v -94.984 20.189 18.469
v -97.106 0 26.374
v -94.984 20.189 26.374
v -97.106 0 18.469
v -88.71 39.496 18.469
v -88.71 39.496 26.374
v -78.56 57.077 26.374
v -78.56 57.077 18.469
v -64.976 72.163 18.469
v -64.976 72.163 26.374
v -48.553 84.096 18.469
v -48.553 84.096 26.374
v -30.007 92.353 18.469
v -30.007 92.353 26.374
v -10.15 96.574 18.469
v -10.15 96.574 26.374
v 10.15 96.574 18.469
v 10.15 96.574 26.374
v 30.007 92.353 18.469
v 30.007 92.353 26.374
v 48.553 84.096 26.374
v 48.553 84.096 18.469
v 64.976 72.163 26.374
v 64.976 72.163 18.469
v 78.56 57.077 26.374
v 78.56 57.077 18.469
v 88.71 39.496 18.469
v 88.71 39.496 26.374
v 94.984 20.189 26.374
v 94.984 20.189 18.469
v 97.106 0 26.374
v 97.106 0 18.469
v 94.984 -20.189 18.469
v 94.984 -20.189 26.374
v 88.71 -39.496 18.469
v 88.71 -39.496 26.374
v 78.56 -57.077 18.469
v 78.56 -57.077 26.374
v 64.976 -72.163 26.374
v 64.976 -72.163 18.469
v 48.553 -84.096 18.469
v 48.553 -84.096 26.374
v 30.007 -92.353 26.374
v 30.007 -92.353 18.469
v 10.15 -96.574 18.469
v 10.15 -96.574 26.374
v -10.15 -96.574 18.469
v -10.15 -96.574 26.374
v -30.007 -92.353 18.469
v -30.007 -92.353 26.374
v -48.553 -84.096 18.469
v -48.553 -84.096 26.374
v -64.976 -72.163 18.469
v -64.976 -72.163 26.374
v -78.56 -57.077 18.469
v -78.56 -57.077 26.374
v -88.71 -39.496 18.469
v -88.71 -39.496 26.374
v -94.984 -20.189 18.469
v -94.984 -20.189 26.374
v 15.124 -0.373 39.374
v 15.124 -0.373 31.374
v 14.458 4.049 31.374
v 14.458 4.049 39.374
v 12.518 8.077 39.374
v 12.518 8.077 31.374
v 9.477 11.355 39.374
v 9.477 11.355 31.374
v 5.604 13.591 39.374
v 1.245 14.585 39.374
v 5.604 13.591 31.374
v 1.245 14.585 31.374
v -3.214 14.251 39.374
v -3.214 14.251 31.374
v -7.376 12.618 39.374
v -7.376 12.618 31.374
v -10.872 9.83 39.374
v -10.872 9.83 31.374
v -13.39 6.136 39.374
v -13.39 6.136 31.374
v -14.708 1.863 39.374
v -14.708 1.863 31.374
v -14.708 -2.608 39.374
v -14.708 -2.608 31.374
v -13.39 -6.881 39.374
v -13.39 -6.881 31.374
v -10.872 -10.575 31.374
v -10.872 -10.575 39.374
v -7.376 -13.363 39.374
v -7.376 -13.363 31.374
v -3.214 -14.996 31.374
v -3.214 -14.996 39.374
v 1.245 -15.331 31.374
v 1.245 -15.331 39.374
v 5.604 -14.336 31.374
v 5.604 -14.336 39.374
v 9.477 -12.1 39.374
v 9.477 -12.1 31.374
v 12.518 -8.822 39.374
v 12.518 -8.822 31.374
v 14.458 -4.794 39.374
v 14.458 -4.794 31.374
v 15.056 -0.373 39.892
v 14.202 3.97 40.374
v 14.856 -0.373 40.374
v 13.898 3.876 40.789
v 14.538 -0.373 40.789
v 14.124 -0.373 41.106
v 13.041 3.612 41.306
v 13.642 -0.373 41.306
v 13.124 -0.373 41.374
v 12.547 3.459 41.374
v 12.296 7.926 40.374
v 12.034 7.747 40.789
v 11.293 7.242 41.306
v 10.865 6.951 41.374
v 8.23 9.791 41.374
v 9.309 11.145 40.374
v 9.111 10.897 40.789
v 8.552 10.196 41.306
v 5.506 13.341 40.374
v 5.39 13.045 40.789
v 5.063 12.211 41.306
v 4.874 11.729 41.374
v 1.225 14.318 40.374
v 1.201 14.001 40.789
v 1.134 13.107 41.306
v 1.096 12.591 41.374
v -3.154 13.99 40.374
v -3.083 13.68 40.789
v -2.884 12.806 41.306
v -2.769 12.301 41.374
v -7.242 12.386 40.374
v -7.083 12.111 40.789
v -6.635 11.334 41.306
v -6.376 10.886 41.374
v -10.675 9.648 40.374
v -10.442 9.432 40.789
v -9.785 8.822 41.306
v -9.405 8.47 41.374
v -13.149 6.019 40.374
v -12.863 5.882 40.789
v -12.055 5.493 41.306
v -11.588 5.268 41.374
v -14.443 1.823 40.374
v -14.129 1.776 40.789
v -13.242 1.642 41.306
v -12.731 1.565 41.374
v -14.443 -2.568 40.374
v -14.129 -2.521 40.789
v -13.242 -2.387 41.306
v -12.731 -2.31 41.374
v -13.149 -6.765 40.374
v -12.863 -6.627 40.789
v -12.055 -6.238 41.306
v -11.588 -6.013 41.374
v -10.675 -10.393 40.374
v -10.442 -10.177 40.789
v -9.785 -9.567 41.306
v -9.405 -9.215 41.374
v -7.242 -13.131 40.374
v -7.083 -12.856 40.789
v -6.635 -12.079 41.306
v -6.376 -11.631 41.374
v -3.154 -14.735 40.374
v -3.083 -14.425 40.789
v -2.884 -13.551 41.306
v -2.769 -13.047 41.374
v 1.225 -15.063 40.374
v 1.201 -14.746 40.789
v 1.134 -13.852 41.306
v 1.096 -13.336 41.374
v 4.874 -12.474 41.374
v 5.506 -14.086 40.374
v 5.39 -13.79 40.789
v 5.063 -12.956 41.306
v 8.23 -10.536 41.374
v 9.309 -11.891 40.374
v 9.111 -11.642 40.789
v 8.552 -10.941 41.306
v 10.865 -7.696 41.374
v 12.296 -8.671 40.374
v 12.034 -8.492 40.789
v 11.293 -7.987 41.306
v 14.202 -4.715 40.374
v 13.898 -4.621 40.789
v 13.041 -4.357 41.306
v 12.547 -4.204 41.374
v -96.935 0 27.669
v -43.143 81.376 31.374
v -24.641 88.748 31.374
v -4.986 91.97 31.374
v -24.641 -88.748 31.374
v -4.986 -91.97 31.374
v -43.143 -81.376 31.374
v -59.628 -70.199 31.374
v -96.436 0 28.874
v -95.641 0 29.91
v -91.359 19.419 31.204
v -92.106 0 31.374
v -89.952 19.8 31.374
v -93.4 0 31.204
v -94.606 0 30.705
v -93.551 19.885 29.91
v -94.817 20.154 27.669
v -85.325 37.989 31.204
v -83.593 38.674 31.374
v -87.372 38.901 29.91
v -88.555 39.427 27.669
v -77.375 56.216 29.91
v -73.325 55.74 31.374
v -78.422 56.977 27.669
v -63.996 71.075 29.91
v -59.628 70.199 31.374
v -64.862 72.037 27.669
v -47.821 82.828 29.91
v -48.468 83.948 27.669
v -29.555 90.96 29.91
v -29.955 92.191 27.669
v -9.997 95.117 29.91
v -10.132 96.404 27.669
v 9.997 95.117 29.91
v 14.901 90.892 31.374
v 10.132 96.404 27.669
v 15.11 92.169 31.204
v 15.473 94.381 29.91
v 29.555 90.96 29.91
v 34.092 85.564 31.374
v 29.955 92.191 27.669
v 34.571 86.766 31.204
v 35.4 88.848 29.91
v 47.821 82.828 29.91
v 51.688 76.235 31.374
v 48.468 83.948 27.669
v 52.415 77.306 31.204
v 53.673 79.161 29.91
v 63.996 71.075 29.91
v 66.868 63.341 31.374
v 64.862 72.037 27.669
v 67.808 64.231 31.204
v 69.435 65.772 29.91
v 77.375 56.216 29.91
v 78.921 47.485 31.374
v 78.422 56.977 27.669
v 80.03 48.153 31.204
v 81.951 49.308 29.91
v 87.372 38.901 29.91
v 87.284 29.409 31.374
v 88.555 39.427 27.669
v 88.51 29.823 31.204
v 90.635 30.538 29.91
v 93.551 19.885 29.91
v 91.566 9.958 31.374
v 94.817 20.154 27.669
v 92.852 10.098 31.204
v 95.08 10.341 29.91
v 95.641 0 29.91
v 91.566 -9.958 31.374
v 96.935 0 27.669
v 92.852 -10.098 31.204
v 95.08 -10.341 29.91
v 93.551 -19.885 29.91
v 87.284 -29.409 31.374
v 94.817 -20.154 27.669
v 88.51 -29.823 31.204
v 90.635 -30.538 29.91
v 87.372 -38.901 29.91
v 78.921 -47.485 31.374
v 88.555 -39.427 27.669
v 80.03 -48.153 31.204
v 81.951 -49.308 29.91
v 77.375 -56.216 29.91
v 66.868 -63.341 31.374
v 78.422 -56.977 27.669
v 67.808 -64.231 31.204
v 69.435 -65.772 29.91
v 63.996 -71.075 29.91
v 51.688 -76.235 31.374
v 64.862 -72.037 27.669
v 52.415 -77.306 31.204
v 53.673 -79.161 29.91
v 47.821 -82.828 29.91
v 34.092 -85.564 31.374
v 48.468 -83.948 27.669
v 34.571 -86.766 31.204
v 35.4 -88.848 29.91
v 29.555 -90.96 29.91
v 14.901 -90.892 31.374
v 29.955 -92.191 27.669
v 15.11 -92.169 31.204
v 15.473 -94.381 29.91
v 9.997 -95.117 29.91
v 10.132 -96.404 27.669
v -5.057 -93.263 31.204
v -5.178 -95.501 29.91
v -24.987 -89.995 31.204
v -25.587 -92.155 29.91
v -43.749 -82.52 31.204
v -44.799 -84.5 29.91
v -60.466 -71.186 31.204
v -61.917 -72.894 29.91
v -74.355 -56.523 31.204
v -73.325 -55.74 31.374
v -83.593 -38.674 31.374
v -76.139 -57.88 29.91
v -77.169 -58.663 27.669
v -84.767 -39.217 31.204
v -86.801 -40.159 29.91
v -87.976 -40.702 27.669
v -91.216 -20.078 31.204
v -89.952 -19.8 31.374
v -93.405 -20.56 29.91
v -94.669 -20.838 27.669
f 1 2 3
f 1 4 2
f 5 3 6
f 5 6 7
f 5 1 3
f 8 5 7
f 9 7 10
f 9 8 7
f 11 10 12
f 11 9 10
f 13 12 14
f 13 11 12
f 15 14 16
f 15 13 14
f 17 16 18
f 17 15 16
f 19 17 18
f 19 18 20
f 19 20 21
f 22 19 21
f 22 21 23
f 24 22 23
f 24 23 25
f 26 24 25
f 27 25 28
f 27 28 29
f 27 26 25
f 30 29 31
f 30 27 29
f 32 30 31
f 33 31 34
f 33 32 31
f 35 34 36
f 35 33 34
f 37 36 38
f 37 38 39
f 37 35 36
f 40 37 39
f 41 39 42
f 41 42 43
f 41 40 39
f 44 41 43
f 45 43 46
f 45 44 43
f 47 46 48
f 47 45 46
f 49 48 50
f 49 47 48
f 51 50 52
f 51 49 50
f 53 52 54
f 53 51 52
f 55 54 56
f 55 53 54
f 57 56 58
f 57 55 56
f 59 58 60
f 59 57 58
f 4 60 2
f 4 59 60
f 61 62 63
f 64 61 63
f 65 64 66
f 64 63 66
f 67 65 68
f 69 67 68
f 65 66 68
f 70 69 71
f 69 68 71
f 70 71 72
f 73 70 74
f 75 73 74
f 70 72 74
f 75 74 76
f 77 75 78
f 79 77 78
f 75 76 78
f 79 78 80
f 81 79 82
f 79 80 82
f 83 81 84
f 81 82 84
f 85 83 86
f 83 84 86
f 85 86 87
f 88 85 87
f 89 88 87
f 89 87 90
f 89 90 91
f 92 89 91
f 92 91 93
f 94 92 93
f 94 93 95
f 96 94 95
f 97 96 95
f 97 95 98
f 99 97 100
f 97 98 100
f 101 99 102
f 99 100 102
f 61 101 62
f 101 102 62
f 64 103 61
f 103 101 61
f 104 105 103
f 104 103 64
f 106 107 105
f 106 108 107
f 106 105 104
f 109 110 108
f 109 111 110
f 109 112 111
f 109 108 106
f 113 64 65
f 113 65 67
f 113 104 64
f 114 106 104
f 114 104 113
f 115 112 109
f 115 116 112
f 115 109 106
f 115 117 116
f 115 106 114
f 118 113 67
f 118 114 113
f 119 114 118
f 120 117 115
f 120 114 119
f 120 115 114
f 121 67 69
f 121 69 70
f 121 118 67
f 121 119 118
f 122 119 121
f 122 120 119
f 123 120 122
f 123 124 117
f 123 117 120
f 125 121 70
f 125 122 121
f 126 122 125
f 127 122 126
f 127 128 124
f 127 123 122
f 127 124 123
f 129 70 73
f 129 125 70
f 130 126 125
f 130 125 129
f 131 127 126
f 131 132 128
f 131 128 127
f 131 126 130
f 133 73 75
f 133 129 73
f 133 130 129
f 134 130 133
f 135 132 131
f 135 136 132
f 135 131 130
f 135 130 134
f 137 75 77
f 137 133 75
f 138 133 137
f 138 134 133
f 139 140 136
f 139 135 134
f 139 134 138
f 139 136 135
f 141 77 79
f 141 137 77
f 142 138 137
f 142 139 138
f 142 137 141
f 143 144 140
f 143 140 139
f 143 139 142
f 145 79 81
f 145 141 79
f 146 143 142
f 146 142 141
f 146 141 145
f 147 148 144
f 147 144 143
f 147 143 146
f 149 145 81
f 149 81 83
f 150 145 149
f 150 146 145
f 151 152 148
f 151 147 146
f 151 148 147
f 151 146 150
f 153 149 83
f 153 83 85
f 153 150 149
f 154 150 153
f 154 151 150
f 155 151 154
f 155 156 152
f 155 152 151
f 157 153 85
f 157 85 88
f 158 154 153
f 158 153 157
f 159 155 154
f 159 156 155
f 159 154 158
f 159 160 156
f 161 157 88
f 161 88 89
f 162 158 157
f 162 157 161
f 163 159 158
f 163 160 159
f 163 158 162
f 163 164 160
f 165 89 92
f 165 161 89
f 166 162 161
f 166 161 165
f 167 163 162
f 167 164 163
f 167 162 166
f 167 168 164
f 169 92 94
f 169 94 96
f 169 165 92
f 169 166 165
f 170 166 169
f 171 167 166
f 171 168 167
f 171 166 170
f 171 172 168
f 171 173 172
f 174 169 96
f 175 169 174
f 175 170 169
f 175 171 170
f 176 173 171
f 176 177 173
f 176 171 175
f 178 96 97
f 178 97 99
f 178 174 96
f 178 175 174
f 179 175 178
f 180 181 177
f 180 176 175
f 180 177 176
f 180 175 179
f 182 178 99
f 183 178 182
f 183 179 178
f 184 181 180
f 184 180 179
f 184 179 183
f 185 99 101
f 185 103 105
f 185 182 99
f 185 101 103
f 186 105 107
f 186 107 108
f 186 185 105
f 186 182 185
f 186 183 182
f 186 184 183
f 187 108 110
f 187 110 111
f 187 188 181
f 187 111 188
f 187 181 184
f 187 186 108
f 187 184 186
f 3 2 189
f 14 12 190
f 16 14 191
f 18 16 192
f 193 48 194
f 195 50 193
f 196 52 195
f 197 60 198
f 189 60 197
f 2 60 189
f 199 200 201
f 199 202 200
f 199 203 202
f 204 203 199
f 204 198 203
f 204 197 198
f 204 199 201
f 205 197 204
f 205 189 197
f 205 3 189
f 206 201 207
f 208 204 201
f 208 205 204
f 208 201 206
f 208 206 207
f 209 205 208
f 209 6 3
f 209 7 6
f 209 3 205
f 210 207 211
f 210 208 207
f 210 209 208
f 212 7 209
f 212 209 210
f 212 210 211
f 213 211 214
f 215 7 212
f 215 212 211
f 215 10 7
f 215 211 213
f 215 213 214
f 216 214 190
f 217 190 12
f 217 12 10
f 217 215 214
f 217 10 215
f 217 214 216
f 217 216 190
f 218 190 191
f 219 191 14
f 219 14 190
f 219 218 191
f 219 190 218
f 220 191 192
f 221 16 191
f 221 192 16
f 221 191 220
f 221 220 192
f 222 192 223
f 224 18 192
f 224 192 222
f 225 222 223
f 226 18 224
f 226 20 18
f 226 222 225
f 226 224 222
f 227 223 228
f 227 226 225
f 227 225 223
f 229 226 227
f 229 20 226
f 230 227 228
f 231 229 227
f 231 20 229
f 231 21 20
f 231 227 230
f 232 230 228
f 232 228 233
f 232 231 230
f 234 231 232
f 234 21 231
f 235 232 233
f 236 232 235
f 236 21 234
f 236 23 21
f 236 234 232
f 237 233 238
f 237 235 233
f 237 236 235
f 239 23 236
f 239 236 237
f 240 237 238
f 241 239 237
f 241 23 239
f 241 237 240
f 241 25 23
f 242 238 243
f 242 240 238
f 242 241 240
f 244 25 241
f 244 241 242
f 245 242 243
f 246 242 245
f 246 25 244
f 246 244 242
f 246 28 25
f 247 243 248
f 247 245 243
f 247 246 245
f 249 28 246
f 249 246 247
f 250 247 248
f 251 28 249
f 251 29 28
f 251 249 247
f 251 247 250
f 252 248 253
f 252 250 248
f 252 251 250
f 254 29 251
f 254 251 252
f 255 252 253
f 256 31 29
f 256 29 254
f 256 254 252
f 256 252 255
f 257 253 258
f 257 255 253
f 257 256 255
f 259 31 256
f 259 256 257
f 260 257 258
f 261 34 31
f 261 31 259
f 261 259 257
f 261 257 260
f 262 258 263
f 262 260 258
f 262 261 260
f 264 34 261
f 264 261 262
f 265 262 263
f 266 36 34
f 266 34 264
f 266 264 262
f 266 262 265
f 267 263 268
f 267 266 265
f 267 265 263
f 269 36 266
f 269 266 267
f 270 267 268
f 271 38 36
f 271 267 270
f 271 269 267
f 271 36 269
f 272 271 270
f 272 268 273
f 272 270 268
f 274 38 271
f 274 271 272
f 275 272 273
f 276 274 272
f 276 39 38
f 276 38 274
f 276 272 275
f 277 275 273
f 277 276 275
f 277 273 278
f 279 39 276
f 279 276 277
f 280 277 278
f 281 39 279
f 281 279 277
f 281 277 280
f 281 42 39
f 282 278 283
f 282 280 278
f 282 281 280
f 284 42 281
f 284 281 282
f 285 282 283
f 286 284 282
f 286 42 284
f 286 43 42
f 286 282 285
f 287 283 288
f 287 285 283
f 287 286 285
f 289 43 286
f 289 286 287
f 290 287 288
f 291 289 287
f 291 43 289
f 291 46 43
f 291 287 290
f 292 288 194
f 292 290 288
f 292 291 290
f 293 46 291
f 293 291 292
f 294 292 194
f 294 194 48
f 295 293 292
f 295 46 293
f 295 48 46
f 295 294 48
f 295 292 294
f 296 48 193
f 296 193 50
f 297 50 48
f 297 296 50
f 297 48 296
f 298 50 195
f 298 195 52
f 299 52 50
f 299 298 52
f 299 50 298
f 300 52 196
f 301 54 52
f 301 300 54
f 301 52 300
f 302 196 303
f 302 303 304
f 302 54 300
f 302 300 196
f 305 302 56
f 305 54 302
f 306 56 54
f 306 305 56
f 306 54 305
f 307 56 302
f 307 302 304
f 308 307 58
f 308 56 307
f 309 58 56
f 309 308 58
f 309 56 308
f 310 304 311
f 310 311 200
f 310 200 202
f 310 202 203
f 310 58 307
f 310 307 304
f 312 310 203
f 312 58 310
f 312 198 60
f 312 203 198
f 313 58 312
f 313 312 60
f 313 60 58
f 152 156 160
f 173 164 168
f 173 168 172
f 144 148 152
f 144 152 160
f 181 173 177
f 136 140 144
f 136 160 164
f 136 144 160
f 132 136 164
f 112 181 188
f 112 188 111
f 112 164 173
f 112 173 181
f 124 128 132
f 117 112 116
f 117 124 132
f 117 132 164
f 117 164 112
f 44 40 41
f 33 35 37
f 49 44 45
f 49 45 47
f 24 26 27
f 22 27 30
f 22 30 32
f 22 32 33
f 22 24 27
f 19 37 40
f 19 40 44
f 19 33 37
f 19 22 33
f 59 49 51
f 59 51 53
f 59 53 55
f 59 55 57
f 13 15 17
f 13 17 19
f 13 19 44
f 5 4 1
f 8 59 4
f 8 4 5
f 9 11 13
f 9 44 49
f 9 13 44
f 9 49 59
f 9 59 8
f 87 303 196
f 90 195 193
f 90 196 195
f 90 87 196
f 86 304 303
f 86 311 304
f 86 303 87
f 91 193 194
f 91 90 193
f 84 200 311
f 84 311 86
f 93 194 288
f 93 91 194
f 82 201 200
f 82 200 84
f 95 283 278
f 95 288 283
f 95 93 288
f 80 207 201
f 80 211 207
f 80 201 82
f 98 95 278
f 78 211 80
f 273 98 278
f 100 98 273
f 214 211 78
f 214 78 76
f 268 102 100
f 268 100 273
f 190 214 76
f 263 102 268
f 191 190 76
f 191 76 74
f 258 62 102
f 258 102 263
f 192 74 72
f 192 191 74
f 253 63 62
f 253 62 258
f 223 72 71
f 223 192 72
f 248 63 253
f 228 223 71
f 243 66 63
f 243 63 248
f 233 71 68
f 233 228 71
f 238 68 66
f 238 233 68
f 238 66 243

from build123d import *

# Parameters (mm, degrees)
F2_R     = 15
F3_DEPTH = 10
F4_R     = 2


with BuildPart() as f1:
    # F0 (on Front) → F1 (revolve)
    with BuildSketch(Plane.XZ):
        with BuildLine():
            Line((-97.105525, 26.374421), (-97.105525, 18.469065))
            Line((-97.105525, 18.469065), (0, 18.469065))
            Line((0, 18.469065), (0, 31.374421))
            Line((0, 31.374421), (-92.105525, 31.374421))
            ThreePointArc((-92.105525, 31.374421), (-95.641059, 29.909955), (-97.105525, 26.374421))
        make_face()
    revolve(axis=Axis((0, 0, 24.921743), (0, 0, -1)))

    # F2 (on face) → F3 (join)
    with BuildSketch(Plane.XY.offset(31.374421)):
        with Locations((0.124191, -0.372573)):
            Circle(F2_R)
    extrude(amount=F3_DEPTH)

    # F4
    f4_edges = [f1.edges().sort_by_distance(p)[0] for p in [
        (-14.875809, -0.372573, 41.374421),
    ]]
    fillet(f4_edges, radius=F4_R)


solid = f1.part
